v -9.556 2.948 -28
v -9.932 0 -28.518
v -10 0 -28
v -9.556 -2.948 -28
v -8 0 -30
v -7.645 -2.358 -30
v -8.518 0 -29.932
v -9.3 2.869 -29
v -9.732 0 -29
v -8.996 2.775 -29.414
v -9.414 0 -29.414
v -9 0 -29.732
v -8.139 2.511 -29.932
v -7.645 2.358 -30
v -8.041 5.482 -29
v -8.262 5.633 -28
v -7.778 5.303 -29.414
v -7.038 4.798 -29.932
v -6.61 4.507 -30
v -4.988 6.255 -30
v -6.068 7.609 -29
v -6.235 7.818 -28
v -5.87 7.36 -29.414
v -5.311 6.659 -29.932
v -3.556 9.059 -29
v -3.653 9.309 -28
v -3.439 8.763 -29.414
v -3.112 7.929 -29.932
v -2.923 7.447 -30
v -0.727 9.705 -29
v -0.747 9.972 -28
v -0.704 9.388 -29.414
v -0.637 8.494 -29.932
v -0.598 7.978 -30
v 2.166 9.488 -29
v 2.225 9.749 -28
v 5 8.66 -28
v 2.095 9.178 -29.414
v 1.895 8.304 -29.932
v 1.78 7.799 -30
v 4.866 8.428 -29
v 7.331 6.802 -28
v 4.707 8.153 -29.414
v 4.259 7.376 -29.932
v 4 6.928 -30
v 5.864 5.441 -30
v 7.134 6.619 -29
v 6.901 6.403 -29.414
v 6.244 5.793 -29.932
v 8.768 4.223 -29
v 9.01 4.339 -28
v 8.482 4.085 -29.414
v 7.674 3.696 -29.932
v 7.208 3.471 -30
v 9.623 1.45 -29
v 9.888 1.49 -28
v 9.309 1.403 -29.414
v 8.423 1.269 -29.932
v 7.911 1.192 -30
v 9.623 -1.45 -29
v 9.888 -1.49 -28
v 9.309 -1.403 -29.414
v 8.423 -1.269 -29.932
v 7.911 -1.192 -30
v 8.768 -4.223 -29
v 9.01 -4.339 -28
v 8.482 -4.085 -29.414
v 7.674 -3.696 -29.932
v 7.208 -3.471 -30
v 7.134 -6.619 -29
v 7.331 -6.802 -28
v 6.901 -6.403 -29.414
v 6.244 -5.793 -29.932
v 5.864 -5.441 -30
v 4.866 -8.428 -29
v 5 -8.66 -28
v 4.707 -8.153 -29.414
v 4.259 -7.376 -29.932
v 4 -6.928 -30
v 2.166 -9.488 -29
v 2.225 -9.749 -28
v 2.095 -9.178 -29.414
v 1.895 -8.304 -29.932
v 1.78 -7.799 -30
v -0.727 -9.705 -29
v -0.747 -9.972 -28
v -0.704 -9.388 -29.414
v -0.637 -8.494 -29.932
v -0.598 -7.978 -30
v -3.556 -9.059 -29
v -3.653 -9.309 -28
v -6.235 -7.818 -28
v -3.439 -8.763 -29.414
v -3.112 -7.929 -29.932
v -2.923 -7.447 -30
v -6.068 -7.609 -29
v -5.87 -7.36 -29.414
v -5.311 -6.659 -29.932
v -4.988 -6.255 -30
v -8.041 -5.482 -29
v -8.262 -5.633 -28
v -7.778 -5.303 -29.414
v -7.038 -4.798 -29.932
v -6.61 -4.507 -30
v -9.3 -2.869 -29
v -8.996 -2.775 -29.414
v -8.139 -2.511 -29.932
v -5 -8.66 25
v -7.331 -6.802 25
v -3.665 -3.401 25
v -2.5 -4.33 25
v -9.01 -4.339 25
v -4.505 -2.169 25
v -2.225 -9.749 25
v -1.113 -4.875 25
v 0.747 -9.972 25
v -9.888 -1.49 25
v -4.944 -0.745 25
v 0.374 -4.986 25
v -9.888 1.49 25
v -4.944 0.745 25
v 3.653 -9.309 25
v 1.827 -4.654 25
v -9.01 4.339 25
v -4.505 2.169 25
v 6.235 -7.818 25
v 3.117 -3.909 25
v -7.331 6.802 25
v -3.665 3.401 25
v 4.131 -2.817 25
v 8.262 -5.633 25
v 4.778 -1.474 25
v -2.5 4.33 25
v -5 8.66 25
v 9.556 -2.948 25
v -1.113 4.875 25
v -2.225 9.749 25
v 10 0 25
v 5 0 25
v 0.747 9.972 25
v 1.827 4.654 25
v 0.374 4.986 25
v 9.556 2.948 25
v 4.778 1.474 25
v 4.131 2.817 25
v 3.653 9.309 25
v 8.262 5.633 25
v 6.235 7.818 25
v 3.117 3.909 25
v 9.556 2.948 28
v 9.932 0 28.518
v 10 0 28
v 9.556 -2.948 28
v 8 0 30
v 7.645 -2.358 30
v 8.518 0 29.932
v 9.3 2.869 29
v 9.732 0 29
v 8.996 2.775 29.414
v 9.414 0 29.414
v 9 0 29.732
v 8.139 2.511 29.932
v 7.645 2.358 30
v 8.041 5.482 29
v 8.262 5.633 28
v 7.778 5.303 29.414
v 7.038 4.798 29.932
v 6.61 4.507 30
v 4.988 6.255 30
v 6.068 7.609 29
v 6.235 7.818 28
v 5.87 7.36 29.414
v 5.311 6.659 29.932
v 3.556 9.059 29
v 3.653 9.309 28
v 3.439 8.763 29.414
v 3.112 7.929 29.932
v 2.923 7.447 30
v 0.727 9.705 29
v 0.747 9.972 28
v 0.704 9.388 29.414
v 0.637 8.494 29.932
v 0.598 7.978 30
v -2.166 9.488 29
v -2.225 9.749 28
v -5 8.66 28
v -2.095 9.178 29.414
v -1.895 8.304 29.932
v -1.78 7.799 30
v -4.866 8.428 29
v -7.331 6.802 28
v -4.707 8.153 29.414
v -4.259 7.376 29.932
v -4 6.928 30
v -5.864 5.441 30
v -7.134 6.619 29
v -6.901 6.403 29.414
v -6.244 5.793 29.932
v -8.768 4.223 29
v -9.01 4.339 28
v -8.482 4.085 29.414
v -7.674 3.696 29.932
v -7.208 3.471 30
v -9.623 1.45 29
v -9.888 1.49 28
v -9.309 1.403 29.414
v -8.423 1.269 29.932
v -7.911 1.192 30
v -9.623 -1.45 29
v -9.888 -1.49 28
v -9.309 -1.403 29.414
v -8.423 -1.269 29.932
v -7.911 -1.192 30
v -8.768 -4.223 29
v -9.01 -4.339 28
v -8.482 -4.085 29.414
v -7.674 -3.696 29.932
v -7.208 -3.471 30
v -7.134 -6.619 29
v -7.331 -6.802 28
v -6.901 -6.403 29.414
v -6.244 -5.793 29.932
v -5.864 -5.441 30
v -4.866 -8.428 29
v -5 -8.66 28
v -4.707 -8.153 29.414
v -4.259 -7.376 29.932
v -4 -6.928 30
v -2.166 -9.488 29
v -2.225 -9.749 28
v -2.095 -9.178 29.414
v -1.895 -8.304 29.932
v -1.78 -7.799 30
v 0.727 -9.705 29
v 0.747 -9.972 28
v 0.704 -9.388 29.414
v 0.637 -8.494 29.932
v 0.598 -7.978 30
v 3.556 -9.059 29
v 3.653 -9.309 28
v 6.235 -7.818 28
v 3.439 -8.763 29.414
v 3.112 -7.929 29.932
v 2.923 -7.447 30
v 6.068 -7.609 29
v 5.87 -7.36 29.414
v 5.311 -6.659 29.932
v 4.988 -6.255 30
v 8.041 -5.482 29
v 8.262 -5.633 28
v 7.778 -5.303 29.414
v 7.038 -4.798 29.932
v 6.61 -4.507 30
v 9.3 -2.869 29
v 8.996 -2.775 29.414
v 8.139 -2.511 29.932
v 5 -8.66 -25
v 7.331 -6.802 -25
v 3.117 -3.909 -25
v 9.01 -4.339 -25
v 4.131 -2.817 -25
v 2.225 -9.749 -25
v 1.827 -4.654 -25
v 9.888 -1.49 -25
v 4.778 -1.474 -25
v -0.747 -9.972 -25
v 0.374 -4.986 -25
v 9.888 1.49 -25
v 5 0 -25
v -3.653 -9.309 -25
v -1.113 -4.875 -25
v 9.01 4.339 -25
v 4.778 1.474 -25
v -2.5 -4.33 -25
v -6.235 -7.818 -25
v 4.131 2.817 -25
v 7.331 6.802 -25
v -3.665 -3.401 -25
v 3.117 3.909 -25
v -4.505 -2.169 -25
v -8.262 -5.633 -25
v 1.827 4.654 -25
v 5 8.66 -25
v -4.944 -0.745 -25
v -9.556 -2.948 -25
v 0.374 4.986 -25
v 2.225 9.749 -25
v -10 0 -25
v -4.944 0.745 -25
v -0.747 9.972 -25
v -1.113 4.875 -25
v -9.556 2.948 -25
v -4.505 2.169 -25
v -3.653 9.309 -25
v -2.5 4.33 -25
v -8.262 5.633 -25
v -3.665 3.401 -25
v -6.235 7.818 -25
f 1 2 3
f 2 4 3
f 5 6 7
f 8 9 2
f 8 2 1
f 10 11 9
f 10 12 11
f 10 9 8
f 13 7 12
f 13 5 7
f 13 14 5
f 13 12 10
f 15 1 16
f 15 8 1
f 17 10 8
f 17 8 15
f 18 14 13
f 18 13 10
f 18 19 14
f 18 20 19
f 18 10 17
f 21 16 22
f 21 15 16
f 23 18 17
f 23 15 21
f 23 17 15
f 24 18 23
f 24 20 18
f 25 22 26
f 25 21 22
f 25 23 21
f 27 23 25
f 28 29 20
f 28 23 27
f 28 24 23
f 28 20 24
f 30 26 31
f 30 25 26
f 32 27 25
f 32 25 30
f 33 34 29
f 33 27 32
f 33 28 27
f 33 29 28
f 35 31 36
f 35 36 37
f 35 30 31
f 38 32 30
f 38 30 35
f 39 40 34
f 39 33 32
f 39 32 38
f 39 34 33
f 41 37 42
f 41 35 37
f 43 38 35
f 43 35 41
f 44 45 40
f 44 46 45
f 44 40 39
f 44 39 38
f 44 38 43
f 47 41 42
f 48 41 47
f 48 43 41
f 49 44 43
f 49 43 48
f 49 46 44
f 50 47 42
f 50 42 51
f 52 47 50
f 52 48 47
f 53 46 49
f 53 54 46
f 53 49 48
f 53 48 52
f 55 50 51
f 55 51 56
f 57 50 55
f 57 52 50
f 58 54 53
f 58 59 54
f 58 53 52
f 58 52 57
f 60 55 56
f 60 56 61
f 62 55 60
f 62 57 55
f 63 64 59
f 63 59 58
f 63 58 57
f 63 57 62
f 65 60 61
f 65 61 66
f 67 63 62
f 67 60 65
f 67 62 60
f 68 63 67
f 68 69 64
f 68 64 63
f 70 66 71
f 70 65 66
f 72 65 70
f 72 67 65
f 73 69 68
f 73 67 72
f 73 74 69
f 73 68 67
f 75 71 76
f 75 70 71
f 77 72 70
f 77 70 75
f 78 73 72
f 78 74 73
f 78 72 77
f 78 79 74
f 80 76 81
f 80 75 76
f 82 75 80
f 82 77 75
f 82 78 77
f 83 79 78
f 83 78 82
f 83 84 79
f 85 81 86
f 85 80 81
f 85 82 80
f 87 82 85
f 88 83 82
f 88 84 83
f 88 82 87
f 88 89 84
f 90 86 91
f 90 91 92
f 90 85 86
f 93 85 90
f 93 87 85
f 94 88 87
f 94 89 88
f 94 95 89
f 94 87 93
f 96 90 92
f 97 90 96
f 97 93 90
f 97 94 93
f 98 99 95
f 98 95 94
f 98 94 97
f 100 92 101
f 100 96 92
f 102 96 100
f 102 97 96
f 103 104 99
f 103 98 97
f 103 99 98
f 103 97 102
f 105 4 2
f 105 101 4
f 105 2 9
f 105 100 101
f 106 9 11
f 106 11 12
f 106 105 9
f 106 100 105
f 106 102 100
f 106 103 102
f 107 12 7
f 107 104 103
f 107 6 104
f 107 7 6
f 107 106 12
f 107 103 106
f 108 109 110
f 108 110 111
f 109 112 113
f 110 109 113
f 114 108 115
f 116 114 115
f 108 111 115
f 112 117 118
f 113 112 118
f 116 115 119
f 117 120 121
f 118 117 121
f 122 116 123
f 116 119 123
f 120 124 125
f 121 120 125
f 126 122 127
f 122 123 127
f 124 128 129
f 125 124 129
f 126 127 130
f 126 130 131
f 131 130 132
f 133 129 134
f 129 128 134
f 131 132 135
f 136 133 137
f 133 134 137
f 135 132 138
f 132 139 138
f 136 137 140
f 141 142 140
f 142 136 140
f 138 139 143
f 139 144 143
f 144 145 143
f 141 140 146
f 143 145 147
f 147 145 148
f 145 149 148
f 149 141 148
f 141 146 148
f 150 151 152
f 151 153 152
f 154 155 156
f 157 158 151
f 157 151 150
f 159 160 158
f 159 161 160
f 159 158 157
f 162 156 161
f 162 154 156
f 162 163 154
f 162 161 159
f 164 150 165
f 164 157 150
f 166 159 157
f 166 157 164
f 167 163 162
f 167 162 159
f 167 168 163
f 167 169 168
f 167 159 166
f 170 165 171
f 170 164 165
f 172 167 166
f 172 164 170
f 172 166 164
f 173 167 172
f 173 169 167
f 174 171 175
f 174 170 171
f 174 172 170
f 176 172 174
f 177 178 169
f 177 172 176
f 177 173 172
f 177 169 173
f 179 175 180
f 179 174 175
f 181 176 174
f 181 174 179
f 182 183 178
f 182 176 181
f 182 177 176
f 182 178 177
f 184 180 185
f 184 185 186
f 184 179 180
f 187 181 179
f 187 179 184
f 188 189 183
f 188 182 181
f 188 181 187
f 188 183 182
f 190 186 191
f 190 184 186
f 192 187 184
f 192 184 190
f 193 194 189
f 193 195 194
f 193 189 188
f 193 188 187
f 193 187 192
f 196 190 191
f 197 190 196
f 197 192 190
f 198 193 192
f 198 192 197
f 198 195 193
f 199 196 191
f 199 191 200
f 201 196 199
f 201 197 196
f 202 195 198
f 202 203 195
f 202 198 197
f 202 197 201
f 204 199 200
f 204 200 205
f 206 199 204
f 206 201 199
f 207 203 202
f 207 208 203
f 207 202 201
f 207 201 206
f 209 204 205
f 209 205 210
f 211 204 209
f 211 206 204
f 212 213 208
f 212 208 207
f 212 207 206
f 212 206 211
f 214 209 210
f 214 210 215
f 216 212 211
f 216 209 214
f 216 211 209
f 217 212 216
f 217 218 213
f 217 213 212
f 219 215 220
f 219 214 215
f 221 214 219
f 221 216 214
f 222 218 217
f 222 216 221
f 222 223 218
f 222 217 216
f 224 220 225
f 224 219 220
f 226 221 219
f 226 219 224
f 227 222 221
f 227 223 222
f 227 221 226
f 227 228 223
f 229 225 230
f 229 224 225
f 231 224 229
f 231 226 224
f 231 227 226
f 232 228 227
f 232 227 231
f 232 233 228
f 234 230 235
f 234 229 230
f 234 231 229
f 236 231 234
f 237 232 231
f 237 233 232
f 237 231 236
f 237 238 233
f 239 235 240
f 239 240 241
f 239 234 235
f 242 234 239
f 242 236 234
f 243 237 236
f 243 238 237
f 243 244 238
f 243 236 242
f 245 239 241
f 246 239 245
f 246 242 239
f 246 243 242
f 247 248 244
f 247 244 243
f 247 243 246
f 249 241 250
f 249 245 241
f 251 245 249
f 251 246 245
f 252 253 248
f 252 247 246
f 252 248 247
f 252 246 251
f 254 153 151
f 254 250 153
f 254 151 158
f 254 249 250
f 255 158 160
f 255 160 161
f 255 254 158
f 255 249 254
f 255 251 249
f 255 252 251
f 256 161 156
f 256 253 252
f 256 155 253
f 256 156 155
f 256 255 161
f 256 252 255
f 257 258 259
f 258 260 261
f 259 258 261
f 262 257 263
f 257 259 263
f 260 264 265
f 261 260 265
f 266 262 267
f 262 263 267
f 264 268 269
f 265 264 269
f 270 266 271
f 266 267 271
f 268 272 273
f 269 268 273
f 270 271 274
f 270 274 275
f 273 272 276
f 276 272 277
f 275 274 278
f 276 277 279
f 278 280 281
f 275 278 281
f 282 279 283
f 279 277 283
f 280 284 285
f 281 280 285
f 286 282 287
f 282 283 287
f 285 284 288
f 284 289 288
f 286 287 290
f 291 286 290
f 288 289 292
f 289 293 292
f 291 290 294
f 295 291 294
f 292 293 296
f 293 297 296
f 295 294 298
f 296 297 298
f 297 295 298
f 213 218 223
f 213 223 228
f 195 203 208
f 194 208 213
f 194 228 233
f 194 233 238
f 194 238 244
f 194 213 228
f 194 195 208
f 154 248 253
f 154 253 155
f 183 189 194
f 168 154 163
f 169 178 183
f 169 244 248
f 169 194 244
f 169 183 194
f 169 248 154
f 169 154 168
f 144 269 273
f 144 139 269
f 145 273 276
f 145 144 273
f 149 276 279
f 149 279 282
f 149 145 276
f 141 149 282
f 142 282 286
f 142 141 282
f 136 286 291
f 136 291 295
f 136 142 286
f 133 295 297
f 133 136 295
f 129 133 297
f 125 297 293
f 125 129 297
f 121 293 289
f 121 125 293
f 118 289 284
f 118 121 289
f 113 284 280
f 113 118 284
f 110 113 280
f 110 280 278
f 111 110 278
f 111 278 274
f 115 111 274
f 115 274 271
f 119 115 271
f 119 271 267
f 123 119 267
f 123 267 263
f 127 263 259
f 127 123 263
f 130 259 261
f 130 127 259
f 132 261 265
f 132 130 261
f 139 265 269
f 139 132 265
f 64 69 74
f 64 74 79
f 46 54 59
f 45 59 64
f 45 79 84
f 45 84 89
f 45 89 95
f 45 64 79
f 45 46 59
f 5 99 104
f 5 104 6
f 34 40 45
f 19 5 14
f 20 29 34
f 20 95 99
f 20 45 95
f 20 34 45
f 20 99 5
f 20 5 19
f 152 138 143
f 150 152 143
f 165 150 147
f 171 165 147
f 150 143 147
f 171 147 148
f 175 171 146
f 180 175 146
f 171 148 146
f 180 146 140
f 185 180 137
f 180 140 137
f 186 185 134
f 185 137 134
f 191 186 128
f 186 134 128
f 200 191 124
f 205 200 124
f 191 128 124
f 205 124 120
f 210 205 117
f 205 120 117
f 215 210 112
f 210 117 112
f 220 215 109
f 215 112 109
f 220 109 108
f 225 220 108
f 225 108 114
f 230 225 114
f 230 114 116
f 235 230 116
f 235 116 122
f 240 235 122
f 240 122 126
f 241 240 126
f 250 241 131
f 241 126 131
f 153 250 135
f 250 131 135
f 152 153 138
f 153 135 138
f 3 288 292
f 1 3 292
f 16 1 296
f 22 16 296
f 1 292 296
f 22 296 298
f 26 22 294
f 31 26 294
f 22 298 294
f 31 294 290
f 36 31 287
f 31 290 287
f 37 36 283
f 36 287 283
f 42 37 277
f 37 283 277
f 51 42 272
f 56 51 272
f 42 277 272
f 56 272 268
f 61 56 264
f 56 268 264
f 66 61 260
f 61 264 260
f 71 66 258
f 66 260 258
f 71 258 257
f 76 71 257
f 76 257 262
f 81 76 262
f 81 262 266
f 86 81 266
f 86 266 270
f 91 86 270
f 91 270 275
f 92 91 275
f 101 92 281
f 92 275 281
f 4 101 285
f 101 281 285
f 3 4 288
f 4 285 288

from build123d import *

# Parameters (mm, degrees)
SKETCH1_R           = 5
BOSS_EXTRUDE1_DEPTH = 25
SKETCH2_R           = 10
BOSS_EXTRUDE2_DEPTH = 5
SKETCH3_R           = 10
BOSS_EXTRUDE3_DEPTH = 5
FILLET1_R           = 2
FILLET2_R           = 2


with BuildPart() as part:
    # Sketch1 → Boss-Extrude1 (new body, symmetric)
    with BuildSketch(Plane.XY):
        Circle(SKETCH1_R)
    extrude(amount=BOSS_EXTRUDE1_DEPTH, both=True)

    # Sketch2 → Boss-Extrude2 (add)
    with BuildSketch(Plane.XY.offset(25)):
        Circle(SKETCH2_R)
    extrude(amount=BOSS_EXTRUDE2_DEPTH)

    # Sketch3 → Boss-Extrude3 (add)
    with BuildSketch(Plane(origin=(0, 0, -25), x_dir=(-1, 0, 0), z_dir=(0, 0, -1))):
        Circle(SKETCH3_R)
    extrude(amount=BOSS_EXTRUDE3_DEPTH)

    # Fillet1
    fillet1_edges = [part.edges().sort_by_distance(p)[0] for p in [
        (-10, 0, 30),
    ]]
    fillet(fillet1_edges, radius=FILLET1_R)

    # Fillet2
    fillet2_edges = [part.edges().sort_by_distance(p)[0] for p in [
        (10, 0, -30),
    ]]
    fillet(fillet2_edges, radius=FILLET2_R)


solid = part.part
